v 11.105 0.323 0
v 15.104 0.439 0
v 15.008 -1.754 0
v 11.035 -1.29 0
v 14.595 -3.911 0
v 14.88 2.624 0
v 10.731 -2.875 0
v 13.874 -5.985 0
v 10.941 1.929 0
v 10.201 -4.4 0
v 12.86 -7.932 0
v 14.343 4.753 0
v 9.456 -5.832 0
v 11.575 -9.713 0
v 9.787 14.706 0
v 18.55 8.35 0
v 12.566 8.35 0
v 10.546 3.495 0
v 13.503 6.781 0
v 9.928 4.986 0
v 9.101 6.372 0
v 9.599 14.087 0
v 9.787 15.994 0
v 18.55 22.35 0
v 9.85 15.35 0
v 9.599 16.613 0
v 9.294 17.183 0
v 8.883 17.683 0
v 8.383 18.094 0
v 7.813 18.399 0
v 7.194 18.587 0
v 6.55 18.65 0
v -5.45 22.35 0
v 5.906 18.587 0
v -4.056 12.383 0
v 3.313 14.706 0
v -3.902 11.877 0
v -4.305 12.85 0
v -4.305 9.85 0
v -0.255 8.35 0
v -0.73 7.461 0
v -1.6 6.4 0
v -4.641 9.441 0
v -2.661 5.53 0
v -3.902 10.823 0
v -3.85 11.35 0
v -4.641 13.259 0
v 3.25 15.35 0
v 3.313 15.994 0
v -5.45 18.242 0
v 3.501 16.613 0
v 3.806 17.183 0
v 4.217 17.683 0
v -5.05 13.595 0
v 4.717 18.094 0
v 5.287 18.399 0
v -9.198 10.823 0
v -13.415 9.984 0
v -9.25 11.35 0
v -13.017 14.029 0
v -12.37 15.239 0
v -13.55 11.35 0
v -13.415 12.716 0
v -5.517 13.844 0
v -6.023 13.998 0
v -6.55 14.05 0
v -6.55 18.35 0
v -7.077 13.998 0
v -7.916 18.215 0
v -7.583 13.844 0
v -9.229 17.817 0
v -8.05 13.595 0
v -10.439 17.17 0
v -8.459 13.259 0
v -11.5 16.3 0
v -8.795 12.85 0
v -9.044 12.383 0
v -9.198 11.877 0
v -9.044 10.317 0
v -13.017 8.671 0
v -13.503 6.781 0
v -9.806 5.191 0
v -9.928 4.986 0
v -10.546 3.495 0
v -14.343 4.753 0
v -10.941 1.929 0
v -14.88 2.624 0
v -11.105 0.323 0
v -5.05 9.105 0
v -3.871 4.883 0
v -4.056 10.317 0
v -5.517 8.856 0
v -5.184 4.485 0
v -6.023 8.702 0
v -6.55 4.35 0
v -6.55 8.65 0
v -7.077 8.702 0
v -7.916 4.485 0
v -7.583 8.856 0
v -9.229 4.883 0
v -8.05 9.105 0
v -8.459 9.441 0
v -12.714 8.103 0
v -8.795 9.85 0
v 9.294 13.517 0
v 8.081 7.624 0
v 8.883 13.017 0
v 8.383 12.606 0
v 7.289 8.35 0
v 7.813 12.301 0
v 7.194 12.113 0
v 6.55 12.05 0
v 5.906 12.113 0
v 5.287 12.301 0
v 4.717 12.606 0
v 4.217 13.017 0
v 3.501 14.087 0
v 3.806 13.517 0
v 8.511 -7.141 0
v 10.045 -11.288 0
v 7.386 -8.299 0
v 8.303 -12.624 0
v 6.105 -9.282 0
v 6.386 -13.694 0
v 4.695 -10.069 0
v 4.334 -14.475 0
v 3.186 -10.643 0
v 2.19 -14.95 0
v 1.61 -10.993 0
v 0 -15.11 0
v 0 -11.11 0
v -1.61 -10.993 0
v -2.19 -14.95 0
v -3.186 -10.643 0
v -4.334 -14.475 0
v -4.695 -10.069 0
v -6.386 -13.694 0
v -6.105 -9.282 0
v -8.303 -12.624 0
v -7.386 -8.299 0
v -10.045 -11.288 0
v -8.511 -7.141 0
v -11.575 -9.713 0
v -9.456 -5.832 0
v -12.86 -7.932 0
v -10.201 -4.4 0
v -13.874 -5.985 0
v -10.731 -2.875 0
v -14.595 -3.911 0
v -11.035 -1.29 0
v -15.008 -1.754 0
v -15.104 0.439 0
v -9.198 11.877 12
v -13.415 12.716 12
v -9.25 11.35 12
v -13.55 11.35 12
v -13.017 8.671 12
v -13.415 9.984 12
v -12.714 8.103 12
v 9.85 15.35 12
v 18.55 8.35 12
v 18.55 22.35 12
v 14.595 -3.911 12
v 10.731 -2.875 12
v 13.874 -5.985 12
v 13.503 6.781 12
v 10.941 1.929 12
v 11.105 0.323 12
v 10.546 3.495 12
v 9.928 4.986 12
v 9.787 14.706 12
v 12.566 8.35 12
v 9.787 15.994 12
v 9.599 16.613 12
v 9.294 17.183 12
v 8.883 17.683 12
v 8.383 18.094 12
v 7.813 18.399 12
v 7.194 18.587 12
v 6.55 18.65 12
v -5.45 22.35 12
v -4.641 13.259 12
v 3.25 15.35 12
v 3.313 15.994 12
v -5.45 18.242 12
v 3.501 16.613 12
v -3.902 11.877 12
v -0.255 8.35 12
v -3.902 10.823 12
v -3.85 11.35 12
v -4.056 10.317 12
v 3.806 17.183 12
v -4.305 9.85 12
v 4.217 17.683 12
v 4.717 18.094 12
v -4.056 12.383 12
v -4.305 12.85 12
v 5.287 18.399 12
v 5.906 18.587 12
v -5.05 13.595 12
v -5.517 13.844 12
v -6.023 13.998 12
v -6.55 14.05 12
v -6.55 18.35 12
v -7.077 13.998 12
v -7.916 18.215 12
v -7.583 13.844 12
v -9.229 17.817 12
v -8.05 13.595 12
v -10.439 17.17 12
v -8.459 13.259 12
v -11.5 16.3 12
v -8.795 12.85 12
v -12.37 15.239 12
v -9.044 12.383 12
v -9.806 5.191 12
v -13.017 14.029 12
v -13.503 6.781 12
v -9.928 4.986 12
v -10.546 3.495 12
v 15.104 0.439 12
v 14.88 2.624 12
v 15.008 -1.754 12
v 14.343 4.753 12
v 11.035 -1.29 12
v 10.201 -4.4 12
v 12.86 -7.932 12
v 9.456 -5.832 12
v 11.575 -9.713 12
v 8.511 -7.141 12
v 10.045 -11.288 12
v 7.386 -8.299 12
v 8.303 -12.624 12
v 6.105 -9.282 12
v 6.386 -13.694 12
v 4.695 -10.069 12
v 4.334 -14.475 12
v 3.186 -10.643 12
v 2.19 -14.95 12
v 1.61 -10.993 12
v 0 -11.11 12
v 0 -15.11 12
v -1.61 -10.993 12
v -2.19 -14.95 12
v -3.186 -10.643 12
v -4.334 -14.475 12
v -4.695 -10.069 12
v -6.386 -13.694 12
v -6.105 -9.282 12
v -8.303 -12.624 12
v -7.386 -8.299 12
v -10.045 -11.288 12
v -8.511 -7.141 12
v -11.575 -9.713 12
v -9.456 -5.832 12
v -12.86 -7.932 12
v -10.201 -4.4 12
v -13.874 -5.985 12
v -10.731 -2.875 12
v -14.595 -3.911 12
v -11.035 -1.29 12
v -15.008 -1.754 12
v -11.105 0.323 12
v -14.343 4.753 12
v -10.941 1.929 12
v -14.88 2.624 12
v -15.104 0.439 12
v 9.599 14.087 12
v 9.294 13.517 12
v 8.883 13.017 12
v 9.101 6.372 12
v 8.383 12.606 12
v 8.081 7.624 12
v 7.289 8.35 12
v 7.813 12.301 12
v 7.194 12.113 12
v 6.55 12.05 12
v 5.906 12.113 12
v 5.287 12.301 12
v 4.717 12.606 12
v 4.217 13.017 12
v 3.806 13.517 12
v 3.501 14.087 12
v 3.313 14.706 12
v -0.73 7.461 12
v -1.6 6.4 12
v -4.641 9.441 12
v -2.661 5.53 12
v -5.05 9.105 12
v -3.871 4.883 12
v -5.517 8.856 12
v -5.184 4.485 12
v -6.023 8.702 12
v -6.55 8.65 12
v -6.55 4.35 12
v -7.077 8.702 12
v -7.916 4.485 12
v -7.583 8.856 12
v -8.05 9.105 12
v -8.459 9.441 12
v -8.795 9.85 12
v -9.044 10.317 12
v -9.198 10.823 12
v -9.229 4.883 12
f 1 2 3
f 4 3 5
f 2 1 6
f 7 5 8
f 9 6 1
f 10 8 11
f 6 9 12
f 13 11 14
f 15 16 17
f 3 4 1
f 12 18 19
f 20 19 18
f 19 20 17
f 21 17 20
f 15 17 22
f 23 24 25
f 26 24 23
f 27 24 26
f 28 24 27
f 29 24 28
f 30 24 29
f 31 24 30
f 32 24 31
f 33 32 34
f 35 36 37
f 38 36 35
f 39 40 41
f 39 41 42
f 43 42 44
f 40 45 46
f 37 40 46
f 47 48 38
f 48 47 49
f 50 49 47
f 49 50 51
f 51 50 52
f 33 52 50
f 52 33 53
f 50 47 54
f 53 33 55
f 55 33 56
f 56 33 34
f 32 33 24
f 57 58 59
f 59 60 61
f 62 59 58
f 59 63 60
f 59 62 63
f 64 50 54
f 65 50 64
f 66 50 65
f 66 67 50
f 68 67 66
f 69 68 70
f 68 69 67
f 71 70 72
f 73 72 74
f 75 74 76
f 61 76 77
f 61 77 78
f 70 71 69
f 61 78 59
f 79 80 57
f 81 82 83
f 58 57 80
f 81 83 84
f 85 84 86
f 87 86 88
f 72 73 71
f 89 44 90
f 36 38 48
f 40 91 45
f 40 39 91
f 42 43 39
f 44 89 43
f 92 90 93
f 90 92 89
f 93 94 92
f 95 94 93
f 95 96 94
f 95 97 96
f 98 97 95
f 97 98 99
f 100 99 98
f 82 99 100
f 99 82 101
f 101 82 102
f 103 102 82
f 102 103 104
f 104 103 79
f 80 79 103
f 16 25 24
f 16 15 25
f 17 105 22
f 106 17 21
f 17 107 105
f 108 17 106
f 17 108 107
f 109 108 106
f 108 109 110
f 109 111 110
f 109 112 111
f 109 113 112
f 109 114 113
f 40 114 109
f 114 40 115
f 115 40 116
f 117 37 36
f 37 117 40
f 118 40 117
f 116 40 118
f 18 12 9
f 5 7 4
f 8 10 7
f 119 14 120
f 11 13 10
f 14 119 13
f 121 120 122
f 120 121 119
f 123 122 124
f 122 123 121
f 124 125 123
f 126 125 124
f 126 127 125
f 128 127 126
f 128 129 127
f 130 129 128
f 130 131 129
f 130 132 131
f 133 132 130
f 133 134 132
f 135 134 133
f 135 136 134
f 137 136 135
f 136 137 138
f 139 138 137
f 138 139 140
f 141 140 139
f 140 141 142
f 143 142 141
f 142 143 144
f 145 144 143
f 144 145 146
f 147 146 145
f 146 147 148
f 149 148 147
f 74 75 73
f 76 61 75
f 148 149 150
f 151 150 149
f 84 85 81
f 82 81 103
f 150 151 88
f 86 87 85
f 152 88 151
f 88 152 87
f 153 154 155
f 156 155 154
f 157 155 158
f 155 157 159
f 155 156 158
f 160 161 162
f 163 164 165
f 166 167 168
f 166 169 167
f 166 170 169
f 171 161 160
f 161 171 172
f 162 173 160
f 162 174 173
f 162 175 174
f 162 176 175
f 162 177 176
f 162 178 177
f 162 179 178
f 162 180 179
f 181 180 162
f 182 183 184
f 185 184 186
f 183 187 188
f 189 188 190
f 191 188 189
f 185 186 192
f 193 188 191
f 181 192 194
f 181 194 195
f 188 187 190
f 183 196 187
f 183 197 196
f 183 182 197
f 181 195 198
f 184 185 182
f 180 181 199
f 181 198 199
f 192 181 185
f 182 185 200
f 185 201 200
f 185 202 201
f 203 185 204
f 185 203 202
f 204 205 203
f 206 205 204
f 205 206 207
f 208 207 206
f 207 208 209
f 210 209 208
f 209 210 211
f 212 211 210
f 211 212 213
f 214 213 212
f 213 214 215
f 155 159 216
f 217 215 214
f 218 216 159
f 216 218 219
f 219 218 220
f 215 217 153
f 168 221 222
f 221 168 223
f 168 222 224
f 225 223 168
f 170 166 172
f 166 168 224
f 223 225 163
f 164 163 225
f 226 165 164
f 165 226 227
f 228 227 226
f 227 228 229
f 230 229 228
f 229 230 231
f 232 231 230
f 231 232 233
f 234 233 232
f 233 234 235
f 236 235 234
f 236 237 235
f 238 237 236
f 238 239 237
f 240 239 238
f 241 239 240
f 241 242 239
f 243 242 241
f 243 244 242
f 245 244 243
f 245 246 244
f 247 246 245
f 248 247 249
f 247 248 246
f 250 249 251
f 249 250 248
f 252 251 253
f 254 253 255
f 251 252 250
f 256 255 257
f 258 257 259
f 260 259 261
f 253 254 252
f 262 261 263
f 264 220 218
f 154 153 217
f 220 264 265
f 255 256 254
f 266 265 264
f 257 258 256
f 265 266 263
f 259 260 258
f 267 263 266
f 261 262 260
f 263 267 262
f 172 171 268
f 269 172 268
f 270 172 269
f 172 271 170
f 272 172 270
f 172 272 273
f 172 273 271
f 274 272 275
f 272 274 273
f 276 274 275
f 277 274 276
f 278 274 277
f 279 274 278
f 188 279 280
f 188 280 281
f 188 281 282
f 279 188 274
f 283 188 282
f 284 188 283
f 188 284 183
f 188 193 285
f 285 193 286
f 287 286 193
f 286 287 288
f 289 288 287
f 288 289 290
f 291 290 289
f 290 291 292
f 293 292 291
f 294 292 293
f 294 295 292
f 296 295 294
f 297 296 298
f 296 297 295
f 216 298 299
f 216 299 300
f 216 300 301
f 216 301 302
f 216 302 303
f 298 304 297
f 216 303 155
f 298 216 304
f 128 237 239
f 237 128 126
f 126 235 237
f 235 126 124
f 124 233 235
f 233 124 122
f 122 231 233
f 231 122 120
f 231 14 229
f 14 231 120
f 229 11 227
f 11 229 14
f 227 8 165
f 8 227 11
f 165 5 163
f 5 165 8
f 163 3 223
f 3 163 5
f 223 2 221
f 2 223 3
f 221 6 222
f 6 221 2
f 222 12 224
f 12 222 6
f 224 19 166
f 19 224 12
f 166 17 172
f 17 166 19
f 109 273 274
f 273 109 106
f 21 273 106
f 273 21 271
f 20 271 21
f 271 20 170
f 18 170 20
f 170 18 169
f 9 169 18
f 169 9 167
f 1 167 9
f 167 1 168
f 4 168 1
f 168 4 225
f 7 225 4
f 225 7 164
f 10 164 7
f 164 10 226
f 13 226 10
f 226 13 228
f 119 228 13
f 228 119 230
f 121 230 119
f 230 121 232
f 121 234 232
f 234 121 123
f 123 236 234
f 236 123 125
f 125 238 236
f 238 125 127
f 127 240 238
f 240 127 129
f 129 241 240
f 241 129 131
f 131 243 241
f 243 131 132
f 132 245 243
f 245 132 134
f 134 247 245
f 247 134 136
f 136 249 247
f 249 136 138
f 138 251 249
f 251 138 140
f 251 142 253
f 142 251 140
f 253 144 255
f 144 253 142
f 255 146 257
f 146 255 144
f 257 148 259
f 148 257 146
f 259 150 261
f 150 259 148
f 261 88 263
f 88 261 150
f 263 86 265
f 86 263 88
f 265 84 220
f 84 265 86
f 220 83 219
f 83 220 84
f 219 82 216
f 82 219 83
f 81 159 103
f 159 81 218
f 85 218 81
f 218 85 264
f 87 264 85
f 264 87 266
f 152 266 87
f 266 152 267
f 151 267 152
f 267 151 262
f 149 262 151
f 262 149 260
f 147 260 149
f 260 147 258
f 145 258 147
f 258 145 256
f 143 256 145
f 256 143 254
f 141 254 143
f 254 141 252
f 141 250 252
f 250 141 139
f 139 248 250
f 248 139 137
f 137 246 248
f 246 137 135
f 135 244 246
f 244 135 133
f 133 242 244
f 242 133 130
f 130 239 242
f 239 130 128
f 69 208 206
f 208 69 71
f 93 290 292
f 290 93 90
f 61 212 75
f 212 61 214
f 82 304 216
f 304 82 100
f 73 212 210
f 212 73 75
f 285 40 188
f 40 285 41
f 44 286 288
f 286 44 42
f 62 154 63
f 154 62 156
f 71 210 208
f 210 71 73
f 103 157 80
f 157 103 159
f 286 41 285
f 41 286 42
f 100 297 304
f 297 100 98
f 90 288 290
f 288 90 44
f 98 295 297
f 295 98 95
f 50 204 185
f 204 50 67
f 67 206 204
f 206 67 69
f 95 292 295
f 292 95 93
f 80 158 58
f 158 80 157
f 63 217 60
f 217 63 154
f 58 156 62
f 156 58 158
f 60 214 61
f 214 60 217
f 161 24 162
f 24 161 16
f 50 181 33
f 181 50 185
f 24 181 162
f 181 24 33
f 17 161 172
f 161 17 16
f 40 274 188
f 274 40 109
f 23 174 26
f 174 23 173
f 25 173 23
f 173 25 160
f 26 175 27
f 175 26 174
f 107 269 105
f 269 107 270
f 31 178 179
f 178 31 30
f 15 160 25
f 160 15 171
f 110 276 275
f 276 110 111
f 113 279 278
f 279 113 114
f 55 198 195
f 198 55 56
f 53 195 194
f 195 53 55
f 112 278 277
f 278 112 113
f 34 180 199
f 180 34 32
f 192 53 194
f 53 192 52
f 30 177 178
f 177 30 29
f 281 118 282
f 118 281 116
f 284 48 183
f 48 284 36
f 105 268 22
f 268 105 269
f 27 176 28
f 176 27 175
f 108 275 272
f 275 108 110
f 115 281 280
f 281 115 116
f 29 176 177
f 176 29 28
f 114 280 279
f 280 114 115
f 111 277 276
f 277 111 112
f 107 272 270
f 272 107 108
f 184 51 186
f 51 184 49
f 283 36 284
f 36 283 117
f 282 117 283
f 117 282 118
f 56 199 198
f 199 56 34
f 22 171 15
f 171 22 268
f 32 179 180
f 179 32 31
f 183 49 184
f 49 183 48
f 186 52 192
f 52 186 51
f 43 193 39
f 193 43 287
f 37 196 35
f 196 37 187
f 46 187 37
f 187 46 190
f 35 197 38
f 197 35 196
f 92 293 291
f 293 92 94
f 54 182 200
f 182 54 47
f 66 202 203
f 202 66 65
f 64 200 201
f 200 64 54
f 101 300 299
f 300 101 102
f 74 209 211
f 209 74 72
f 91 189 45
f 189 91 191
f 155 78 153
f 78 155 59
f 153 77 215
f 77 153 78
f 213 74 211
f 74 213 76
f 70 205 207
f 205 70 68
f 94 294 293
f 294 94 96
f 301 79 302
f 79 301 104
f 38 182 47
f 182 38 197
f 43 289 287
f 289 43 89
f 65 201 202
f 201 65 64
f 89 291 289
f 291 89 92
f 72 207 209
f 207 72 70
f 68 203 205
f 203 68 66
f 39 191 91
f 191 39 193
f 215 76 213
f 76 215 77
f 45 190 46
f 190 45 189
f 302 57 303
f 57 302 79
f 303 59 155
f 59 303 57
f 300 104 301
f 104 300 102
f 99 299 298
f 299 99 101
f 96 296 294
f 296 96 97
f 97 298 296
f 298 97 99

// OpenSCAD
$fn = 32;

// ----------------------------------------------------------------------
// Pipe clamp: 30.22 mm ring, 4 mm wall, 12 mm wide
// ----------------------------------------------------------------------

// --- parameters (mm) ---
outer_r = 15.11;          // clamp outside radius
inner_r = 11.11;          // pipe bore radius
band = 4;                 // band thickness
clamp_w = 12;             // clamp width
opening = 60;             // opening angle between the ends
lug_w = 24;               // lug width
lug_len = 14;             // lug length
bolt_d = 6.6;             // bolt hole
knuckle_d = 14;           // hinge knuckle diameter
pin_d = 5.4;              // hinge pin hole

clamp_profile = [[-7.555, 13.086], [-9.372, 11.853], [-10.991, 10.369], [-12.377, 8.667], [-13.503, 6.781], [-14.343, 4.753], [-14.88, 2.624], [-15.104, 0.439], [-15.008, -1.754], [-14.595, -3.911], [-13.874, -5.985], [-12.86, -7.932], [-11.575, -9.713], [-10.045, -11.288], [-8.303, -12.624], [-6.386, -13.694], [-4.334, -14.475], [-2.19, -14.95], [0, -15.11], [2.19, -14.95], [4.334, -14.475], [6.386, -13.694], [8.303, -12.624], [10.045, -11.288], [11.575, -9.713], [12.86, -7.932], [13.874, -5.985], [14.595, -3.911], [15.008, -1.754], [15.104, 0.439], [14.88, 2.624], [14.343, 4.753], [13.503, 6.781], [12.377, 8.667], [10.991, 10.369], [9.372, 11.853], [7.555, 13.086], [5.555, 9.622], [6.891, 8.715], [8.081, 7.624], [9.101, 6.372], [9.928, 4.986], [10.546, 3.495], [10.941, 1.929], [11.105, 0.323], [11.035, -1.29], [10.731, -2.875], [10.201, -4.4], [9.456, -5.832], [8.511, -7.141], [7.386, -8.299], [6.105, -9.282], [4.695, -10.069], [3.186, -10.643], [1.61, -10.993], [0, -11.11], [-1.61, -10.993], [-3.186, -10.643], [-4.695, -10.069], [-6.105, -9.282], [-7.386, -8.299], [-8.511, -7.141], [-9.456, -5.832], [-10.201, -4.4], [-10.731, -2.875], [-11.035, -1.29], [-11.105, 0.323], [-10.941, 1.929], [-10.546, 3.495], [-9.928, 4.986], [-9.101, 6.372], [-8.081, 7.624], [-6.891, 8.715], [-5.555, 9.622]];

difference() {
  union() {
    linear_extrude(height = clamp_w) polygon(clamp_profile);
    /* hinge knuckle, sunk 2 mm into the band end */
    translate([-6.55, 11.35, 0]) cylinder(h = clamp_w, d = knuckle_d);
    /* bolt lug on the other end */
    translate([-5.45, 8.35, 0]) cube([lug_w, 14, clamp_w]);
  }
  translate([6.55, 15.35, -2.5]) cylinder(h = clamp_w + 5, d = bolt_d);
  translate([-6.55, 11.35, -2.5]) cylinder(h = clamp_w + 5, d = pin_d);
}
